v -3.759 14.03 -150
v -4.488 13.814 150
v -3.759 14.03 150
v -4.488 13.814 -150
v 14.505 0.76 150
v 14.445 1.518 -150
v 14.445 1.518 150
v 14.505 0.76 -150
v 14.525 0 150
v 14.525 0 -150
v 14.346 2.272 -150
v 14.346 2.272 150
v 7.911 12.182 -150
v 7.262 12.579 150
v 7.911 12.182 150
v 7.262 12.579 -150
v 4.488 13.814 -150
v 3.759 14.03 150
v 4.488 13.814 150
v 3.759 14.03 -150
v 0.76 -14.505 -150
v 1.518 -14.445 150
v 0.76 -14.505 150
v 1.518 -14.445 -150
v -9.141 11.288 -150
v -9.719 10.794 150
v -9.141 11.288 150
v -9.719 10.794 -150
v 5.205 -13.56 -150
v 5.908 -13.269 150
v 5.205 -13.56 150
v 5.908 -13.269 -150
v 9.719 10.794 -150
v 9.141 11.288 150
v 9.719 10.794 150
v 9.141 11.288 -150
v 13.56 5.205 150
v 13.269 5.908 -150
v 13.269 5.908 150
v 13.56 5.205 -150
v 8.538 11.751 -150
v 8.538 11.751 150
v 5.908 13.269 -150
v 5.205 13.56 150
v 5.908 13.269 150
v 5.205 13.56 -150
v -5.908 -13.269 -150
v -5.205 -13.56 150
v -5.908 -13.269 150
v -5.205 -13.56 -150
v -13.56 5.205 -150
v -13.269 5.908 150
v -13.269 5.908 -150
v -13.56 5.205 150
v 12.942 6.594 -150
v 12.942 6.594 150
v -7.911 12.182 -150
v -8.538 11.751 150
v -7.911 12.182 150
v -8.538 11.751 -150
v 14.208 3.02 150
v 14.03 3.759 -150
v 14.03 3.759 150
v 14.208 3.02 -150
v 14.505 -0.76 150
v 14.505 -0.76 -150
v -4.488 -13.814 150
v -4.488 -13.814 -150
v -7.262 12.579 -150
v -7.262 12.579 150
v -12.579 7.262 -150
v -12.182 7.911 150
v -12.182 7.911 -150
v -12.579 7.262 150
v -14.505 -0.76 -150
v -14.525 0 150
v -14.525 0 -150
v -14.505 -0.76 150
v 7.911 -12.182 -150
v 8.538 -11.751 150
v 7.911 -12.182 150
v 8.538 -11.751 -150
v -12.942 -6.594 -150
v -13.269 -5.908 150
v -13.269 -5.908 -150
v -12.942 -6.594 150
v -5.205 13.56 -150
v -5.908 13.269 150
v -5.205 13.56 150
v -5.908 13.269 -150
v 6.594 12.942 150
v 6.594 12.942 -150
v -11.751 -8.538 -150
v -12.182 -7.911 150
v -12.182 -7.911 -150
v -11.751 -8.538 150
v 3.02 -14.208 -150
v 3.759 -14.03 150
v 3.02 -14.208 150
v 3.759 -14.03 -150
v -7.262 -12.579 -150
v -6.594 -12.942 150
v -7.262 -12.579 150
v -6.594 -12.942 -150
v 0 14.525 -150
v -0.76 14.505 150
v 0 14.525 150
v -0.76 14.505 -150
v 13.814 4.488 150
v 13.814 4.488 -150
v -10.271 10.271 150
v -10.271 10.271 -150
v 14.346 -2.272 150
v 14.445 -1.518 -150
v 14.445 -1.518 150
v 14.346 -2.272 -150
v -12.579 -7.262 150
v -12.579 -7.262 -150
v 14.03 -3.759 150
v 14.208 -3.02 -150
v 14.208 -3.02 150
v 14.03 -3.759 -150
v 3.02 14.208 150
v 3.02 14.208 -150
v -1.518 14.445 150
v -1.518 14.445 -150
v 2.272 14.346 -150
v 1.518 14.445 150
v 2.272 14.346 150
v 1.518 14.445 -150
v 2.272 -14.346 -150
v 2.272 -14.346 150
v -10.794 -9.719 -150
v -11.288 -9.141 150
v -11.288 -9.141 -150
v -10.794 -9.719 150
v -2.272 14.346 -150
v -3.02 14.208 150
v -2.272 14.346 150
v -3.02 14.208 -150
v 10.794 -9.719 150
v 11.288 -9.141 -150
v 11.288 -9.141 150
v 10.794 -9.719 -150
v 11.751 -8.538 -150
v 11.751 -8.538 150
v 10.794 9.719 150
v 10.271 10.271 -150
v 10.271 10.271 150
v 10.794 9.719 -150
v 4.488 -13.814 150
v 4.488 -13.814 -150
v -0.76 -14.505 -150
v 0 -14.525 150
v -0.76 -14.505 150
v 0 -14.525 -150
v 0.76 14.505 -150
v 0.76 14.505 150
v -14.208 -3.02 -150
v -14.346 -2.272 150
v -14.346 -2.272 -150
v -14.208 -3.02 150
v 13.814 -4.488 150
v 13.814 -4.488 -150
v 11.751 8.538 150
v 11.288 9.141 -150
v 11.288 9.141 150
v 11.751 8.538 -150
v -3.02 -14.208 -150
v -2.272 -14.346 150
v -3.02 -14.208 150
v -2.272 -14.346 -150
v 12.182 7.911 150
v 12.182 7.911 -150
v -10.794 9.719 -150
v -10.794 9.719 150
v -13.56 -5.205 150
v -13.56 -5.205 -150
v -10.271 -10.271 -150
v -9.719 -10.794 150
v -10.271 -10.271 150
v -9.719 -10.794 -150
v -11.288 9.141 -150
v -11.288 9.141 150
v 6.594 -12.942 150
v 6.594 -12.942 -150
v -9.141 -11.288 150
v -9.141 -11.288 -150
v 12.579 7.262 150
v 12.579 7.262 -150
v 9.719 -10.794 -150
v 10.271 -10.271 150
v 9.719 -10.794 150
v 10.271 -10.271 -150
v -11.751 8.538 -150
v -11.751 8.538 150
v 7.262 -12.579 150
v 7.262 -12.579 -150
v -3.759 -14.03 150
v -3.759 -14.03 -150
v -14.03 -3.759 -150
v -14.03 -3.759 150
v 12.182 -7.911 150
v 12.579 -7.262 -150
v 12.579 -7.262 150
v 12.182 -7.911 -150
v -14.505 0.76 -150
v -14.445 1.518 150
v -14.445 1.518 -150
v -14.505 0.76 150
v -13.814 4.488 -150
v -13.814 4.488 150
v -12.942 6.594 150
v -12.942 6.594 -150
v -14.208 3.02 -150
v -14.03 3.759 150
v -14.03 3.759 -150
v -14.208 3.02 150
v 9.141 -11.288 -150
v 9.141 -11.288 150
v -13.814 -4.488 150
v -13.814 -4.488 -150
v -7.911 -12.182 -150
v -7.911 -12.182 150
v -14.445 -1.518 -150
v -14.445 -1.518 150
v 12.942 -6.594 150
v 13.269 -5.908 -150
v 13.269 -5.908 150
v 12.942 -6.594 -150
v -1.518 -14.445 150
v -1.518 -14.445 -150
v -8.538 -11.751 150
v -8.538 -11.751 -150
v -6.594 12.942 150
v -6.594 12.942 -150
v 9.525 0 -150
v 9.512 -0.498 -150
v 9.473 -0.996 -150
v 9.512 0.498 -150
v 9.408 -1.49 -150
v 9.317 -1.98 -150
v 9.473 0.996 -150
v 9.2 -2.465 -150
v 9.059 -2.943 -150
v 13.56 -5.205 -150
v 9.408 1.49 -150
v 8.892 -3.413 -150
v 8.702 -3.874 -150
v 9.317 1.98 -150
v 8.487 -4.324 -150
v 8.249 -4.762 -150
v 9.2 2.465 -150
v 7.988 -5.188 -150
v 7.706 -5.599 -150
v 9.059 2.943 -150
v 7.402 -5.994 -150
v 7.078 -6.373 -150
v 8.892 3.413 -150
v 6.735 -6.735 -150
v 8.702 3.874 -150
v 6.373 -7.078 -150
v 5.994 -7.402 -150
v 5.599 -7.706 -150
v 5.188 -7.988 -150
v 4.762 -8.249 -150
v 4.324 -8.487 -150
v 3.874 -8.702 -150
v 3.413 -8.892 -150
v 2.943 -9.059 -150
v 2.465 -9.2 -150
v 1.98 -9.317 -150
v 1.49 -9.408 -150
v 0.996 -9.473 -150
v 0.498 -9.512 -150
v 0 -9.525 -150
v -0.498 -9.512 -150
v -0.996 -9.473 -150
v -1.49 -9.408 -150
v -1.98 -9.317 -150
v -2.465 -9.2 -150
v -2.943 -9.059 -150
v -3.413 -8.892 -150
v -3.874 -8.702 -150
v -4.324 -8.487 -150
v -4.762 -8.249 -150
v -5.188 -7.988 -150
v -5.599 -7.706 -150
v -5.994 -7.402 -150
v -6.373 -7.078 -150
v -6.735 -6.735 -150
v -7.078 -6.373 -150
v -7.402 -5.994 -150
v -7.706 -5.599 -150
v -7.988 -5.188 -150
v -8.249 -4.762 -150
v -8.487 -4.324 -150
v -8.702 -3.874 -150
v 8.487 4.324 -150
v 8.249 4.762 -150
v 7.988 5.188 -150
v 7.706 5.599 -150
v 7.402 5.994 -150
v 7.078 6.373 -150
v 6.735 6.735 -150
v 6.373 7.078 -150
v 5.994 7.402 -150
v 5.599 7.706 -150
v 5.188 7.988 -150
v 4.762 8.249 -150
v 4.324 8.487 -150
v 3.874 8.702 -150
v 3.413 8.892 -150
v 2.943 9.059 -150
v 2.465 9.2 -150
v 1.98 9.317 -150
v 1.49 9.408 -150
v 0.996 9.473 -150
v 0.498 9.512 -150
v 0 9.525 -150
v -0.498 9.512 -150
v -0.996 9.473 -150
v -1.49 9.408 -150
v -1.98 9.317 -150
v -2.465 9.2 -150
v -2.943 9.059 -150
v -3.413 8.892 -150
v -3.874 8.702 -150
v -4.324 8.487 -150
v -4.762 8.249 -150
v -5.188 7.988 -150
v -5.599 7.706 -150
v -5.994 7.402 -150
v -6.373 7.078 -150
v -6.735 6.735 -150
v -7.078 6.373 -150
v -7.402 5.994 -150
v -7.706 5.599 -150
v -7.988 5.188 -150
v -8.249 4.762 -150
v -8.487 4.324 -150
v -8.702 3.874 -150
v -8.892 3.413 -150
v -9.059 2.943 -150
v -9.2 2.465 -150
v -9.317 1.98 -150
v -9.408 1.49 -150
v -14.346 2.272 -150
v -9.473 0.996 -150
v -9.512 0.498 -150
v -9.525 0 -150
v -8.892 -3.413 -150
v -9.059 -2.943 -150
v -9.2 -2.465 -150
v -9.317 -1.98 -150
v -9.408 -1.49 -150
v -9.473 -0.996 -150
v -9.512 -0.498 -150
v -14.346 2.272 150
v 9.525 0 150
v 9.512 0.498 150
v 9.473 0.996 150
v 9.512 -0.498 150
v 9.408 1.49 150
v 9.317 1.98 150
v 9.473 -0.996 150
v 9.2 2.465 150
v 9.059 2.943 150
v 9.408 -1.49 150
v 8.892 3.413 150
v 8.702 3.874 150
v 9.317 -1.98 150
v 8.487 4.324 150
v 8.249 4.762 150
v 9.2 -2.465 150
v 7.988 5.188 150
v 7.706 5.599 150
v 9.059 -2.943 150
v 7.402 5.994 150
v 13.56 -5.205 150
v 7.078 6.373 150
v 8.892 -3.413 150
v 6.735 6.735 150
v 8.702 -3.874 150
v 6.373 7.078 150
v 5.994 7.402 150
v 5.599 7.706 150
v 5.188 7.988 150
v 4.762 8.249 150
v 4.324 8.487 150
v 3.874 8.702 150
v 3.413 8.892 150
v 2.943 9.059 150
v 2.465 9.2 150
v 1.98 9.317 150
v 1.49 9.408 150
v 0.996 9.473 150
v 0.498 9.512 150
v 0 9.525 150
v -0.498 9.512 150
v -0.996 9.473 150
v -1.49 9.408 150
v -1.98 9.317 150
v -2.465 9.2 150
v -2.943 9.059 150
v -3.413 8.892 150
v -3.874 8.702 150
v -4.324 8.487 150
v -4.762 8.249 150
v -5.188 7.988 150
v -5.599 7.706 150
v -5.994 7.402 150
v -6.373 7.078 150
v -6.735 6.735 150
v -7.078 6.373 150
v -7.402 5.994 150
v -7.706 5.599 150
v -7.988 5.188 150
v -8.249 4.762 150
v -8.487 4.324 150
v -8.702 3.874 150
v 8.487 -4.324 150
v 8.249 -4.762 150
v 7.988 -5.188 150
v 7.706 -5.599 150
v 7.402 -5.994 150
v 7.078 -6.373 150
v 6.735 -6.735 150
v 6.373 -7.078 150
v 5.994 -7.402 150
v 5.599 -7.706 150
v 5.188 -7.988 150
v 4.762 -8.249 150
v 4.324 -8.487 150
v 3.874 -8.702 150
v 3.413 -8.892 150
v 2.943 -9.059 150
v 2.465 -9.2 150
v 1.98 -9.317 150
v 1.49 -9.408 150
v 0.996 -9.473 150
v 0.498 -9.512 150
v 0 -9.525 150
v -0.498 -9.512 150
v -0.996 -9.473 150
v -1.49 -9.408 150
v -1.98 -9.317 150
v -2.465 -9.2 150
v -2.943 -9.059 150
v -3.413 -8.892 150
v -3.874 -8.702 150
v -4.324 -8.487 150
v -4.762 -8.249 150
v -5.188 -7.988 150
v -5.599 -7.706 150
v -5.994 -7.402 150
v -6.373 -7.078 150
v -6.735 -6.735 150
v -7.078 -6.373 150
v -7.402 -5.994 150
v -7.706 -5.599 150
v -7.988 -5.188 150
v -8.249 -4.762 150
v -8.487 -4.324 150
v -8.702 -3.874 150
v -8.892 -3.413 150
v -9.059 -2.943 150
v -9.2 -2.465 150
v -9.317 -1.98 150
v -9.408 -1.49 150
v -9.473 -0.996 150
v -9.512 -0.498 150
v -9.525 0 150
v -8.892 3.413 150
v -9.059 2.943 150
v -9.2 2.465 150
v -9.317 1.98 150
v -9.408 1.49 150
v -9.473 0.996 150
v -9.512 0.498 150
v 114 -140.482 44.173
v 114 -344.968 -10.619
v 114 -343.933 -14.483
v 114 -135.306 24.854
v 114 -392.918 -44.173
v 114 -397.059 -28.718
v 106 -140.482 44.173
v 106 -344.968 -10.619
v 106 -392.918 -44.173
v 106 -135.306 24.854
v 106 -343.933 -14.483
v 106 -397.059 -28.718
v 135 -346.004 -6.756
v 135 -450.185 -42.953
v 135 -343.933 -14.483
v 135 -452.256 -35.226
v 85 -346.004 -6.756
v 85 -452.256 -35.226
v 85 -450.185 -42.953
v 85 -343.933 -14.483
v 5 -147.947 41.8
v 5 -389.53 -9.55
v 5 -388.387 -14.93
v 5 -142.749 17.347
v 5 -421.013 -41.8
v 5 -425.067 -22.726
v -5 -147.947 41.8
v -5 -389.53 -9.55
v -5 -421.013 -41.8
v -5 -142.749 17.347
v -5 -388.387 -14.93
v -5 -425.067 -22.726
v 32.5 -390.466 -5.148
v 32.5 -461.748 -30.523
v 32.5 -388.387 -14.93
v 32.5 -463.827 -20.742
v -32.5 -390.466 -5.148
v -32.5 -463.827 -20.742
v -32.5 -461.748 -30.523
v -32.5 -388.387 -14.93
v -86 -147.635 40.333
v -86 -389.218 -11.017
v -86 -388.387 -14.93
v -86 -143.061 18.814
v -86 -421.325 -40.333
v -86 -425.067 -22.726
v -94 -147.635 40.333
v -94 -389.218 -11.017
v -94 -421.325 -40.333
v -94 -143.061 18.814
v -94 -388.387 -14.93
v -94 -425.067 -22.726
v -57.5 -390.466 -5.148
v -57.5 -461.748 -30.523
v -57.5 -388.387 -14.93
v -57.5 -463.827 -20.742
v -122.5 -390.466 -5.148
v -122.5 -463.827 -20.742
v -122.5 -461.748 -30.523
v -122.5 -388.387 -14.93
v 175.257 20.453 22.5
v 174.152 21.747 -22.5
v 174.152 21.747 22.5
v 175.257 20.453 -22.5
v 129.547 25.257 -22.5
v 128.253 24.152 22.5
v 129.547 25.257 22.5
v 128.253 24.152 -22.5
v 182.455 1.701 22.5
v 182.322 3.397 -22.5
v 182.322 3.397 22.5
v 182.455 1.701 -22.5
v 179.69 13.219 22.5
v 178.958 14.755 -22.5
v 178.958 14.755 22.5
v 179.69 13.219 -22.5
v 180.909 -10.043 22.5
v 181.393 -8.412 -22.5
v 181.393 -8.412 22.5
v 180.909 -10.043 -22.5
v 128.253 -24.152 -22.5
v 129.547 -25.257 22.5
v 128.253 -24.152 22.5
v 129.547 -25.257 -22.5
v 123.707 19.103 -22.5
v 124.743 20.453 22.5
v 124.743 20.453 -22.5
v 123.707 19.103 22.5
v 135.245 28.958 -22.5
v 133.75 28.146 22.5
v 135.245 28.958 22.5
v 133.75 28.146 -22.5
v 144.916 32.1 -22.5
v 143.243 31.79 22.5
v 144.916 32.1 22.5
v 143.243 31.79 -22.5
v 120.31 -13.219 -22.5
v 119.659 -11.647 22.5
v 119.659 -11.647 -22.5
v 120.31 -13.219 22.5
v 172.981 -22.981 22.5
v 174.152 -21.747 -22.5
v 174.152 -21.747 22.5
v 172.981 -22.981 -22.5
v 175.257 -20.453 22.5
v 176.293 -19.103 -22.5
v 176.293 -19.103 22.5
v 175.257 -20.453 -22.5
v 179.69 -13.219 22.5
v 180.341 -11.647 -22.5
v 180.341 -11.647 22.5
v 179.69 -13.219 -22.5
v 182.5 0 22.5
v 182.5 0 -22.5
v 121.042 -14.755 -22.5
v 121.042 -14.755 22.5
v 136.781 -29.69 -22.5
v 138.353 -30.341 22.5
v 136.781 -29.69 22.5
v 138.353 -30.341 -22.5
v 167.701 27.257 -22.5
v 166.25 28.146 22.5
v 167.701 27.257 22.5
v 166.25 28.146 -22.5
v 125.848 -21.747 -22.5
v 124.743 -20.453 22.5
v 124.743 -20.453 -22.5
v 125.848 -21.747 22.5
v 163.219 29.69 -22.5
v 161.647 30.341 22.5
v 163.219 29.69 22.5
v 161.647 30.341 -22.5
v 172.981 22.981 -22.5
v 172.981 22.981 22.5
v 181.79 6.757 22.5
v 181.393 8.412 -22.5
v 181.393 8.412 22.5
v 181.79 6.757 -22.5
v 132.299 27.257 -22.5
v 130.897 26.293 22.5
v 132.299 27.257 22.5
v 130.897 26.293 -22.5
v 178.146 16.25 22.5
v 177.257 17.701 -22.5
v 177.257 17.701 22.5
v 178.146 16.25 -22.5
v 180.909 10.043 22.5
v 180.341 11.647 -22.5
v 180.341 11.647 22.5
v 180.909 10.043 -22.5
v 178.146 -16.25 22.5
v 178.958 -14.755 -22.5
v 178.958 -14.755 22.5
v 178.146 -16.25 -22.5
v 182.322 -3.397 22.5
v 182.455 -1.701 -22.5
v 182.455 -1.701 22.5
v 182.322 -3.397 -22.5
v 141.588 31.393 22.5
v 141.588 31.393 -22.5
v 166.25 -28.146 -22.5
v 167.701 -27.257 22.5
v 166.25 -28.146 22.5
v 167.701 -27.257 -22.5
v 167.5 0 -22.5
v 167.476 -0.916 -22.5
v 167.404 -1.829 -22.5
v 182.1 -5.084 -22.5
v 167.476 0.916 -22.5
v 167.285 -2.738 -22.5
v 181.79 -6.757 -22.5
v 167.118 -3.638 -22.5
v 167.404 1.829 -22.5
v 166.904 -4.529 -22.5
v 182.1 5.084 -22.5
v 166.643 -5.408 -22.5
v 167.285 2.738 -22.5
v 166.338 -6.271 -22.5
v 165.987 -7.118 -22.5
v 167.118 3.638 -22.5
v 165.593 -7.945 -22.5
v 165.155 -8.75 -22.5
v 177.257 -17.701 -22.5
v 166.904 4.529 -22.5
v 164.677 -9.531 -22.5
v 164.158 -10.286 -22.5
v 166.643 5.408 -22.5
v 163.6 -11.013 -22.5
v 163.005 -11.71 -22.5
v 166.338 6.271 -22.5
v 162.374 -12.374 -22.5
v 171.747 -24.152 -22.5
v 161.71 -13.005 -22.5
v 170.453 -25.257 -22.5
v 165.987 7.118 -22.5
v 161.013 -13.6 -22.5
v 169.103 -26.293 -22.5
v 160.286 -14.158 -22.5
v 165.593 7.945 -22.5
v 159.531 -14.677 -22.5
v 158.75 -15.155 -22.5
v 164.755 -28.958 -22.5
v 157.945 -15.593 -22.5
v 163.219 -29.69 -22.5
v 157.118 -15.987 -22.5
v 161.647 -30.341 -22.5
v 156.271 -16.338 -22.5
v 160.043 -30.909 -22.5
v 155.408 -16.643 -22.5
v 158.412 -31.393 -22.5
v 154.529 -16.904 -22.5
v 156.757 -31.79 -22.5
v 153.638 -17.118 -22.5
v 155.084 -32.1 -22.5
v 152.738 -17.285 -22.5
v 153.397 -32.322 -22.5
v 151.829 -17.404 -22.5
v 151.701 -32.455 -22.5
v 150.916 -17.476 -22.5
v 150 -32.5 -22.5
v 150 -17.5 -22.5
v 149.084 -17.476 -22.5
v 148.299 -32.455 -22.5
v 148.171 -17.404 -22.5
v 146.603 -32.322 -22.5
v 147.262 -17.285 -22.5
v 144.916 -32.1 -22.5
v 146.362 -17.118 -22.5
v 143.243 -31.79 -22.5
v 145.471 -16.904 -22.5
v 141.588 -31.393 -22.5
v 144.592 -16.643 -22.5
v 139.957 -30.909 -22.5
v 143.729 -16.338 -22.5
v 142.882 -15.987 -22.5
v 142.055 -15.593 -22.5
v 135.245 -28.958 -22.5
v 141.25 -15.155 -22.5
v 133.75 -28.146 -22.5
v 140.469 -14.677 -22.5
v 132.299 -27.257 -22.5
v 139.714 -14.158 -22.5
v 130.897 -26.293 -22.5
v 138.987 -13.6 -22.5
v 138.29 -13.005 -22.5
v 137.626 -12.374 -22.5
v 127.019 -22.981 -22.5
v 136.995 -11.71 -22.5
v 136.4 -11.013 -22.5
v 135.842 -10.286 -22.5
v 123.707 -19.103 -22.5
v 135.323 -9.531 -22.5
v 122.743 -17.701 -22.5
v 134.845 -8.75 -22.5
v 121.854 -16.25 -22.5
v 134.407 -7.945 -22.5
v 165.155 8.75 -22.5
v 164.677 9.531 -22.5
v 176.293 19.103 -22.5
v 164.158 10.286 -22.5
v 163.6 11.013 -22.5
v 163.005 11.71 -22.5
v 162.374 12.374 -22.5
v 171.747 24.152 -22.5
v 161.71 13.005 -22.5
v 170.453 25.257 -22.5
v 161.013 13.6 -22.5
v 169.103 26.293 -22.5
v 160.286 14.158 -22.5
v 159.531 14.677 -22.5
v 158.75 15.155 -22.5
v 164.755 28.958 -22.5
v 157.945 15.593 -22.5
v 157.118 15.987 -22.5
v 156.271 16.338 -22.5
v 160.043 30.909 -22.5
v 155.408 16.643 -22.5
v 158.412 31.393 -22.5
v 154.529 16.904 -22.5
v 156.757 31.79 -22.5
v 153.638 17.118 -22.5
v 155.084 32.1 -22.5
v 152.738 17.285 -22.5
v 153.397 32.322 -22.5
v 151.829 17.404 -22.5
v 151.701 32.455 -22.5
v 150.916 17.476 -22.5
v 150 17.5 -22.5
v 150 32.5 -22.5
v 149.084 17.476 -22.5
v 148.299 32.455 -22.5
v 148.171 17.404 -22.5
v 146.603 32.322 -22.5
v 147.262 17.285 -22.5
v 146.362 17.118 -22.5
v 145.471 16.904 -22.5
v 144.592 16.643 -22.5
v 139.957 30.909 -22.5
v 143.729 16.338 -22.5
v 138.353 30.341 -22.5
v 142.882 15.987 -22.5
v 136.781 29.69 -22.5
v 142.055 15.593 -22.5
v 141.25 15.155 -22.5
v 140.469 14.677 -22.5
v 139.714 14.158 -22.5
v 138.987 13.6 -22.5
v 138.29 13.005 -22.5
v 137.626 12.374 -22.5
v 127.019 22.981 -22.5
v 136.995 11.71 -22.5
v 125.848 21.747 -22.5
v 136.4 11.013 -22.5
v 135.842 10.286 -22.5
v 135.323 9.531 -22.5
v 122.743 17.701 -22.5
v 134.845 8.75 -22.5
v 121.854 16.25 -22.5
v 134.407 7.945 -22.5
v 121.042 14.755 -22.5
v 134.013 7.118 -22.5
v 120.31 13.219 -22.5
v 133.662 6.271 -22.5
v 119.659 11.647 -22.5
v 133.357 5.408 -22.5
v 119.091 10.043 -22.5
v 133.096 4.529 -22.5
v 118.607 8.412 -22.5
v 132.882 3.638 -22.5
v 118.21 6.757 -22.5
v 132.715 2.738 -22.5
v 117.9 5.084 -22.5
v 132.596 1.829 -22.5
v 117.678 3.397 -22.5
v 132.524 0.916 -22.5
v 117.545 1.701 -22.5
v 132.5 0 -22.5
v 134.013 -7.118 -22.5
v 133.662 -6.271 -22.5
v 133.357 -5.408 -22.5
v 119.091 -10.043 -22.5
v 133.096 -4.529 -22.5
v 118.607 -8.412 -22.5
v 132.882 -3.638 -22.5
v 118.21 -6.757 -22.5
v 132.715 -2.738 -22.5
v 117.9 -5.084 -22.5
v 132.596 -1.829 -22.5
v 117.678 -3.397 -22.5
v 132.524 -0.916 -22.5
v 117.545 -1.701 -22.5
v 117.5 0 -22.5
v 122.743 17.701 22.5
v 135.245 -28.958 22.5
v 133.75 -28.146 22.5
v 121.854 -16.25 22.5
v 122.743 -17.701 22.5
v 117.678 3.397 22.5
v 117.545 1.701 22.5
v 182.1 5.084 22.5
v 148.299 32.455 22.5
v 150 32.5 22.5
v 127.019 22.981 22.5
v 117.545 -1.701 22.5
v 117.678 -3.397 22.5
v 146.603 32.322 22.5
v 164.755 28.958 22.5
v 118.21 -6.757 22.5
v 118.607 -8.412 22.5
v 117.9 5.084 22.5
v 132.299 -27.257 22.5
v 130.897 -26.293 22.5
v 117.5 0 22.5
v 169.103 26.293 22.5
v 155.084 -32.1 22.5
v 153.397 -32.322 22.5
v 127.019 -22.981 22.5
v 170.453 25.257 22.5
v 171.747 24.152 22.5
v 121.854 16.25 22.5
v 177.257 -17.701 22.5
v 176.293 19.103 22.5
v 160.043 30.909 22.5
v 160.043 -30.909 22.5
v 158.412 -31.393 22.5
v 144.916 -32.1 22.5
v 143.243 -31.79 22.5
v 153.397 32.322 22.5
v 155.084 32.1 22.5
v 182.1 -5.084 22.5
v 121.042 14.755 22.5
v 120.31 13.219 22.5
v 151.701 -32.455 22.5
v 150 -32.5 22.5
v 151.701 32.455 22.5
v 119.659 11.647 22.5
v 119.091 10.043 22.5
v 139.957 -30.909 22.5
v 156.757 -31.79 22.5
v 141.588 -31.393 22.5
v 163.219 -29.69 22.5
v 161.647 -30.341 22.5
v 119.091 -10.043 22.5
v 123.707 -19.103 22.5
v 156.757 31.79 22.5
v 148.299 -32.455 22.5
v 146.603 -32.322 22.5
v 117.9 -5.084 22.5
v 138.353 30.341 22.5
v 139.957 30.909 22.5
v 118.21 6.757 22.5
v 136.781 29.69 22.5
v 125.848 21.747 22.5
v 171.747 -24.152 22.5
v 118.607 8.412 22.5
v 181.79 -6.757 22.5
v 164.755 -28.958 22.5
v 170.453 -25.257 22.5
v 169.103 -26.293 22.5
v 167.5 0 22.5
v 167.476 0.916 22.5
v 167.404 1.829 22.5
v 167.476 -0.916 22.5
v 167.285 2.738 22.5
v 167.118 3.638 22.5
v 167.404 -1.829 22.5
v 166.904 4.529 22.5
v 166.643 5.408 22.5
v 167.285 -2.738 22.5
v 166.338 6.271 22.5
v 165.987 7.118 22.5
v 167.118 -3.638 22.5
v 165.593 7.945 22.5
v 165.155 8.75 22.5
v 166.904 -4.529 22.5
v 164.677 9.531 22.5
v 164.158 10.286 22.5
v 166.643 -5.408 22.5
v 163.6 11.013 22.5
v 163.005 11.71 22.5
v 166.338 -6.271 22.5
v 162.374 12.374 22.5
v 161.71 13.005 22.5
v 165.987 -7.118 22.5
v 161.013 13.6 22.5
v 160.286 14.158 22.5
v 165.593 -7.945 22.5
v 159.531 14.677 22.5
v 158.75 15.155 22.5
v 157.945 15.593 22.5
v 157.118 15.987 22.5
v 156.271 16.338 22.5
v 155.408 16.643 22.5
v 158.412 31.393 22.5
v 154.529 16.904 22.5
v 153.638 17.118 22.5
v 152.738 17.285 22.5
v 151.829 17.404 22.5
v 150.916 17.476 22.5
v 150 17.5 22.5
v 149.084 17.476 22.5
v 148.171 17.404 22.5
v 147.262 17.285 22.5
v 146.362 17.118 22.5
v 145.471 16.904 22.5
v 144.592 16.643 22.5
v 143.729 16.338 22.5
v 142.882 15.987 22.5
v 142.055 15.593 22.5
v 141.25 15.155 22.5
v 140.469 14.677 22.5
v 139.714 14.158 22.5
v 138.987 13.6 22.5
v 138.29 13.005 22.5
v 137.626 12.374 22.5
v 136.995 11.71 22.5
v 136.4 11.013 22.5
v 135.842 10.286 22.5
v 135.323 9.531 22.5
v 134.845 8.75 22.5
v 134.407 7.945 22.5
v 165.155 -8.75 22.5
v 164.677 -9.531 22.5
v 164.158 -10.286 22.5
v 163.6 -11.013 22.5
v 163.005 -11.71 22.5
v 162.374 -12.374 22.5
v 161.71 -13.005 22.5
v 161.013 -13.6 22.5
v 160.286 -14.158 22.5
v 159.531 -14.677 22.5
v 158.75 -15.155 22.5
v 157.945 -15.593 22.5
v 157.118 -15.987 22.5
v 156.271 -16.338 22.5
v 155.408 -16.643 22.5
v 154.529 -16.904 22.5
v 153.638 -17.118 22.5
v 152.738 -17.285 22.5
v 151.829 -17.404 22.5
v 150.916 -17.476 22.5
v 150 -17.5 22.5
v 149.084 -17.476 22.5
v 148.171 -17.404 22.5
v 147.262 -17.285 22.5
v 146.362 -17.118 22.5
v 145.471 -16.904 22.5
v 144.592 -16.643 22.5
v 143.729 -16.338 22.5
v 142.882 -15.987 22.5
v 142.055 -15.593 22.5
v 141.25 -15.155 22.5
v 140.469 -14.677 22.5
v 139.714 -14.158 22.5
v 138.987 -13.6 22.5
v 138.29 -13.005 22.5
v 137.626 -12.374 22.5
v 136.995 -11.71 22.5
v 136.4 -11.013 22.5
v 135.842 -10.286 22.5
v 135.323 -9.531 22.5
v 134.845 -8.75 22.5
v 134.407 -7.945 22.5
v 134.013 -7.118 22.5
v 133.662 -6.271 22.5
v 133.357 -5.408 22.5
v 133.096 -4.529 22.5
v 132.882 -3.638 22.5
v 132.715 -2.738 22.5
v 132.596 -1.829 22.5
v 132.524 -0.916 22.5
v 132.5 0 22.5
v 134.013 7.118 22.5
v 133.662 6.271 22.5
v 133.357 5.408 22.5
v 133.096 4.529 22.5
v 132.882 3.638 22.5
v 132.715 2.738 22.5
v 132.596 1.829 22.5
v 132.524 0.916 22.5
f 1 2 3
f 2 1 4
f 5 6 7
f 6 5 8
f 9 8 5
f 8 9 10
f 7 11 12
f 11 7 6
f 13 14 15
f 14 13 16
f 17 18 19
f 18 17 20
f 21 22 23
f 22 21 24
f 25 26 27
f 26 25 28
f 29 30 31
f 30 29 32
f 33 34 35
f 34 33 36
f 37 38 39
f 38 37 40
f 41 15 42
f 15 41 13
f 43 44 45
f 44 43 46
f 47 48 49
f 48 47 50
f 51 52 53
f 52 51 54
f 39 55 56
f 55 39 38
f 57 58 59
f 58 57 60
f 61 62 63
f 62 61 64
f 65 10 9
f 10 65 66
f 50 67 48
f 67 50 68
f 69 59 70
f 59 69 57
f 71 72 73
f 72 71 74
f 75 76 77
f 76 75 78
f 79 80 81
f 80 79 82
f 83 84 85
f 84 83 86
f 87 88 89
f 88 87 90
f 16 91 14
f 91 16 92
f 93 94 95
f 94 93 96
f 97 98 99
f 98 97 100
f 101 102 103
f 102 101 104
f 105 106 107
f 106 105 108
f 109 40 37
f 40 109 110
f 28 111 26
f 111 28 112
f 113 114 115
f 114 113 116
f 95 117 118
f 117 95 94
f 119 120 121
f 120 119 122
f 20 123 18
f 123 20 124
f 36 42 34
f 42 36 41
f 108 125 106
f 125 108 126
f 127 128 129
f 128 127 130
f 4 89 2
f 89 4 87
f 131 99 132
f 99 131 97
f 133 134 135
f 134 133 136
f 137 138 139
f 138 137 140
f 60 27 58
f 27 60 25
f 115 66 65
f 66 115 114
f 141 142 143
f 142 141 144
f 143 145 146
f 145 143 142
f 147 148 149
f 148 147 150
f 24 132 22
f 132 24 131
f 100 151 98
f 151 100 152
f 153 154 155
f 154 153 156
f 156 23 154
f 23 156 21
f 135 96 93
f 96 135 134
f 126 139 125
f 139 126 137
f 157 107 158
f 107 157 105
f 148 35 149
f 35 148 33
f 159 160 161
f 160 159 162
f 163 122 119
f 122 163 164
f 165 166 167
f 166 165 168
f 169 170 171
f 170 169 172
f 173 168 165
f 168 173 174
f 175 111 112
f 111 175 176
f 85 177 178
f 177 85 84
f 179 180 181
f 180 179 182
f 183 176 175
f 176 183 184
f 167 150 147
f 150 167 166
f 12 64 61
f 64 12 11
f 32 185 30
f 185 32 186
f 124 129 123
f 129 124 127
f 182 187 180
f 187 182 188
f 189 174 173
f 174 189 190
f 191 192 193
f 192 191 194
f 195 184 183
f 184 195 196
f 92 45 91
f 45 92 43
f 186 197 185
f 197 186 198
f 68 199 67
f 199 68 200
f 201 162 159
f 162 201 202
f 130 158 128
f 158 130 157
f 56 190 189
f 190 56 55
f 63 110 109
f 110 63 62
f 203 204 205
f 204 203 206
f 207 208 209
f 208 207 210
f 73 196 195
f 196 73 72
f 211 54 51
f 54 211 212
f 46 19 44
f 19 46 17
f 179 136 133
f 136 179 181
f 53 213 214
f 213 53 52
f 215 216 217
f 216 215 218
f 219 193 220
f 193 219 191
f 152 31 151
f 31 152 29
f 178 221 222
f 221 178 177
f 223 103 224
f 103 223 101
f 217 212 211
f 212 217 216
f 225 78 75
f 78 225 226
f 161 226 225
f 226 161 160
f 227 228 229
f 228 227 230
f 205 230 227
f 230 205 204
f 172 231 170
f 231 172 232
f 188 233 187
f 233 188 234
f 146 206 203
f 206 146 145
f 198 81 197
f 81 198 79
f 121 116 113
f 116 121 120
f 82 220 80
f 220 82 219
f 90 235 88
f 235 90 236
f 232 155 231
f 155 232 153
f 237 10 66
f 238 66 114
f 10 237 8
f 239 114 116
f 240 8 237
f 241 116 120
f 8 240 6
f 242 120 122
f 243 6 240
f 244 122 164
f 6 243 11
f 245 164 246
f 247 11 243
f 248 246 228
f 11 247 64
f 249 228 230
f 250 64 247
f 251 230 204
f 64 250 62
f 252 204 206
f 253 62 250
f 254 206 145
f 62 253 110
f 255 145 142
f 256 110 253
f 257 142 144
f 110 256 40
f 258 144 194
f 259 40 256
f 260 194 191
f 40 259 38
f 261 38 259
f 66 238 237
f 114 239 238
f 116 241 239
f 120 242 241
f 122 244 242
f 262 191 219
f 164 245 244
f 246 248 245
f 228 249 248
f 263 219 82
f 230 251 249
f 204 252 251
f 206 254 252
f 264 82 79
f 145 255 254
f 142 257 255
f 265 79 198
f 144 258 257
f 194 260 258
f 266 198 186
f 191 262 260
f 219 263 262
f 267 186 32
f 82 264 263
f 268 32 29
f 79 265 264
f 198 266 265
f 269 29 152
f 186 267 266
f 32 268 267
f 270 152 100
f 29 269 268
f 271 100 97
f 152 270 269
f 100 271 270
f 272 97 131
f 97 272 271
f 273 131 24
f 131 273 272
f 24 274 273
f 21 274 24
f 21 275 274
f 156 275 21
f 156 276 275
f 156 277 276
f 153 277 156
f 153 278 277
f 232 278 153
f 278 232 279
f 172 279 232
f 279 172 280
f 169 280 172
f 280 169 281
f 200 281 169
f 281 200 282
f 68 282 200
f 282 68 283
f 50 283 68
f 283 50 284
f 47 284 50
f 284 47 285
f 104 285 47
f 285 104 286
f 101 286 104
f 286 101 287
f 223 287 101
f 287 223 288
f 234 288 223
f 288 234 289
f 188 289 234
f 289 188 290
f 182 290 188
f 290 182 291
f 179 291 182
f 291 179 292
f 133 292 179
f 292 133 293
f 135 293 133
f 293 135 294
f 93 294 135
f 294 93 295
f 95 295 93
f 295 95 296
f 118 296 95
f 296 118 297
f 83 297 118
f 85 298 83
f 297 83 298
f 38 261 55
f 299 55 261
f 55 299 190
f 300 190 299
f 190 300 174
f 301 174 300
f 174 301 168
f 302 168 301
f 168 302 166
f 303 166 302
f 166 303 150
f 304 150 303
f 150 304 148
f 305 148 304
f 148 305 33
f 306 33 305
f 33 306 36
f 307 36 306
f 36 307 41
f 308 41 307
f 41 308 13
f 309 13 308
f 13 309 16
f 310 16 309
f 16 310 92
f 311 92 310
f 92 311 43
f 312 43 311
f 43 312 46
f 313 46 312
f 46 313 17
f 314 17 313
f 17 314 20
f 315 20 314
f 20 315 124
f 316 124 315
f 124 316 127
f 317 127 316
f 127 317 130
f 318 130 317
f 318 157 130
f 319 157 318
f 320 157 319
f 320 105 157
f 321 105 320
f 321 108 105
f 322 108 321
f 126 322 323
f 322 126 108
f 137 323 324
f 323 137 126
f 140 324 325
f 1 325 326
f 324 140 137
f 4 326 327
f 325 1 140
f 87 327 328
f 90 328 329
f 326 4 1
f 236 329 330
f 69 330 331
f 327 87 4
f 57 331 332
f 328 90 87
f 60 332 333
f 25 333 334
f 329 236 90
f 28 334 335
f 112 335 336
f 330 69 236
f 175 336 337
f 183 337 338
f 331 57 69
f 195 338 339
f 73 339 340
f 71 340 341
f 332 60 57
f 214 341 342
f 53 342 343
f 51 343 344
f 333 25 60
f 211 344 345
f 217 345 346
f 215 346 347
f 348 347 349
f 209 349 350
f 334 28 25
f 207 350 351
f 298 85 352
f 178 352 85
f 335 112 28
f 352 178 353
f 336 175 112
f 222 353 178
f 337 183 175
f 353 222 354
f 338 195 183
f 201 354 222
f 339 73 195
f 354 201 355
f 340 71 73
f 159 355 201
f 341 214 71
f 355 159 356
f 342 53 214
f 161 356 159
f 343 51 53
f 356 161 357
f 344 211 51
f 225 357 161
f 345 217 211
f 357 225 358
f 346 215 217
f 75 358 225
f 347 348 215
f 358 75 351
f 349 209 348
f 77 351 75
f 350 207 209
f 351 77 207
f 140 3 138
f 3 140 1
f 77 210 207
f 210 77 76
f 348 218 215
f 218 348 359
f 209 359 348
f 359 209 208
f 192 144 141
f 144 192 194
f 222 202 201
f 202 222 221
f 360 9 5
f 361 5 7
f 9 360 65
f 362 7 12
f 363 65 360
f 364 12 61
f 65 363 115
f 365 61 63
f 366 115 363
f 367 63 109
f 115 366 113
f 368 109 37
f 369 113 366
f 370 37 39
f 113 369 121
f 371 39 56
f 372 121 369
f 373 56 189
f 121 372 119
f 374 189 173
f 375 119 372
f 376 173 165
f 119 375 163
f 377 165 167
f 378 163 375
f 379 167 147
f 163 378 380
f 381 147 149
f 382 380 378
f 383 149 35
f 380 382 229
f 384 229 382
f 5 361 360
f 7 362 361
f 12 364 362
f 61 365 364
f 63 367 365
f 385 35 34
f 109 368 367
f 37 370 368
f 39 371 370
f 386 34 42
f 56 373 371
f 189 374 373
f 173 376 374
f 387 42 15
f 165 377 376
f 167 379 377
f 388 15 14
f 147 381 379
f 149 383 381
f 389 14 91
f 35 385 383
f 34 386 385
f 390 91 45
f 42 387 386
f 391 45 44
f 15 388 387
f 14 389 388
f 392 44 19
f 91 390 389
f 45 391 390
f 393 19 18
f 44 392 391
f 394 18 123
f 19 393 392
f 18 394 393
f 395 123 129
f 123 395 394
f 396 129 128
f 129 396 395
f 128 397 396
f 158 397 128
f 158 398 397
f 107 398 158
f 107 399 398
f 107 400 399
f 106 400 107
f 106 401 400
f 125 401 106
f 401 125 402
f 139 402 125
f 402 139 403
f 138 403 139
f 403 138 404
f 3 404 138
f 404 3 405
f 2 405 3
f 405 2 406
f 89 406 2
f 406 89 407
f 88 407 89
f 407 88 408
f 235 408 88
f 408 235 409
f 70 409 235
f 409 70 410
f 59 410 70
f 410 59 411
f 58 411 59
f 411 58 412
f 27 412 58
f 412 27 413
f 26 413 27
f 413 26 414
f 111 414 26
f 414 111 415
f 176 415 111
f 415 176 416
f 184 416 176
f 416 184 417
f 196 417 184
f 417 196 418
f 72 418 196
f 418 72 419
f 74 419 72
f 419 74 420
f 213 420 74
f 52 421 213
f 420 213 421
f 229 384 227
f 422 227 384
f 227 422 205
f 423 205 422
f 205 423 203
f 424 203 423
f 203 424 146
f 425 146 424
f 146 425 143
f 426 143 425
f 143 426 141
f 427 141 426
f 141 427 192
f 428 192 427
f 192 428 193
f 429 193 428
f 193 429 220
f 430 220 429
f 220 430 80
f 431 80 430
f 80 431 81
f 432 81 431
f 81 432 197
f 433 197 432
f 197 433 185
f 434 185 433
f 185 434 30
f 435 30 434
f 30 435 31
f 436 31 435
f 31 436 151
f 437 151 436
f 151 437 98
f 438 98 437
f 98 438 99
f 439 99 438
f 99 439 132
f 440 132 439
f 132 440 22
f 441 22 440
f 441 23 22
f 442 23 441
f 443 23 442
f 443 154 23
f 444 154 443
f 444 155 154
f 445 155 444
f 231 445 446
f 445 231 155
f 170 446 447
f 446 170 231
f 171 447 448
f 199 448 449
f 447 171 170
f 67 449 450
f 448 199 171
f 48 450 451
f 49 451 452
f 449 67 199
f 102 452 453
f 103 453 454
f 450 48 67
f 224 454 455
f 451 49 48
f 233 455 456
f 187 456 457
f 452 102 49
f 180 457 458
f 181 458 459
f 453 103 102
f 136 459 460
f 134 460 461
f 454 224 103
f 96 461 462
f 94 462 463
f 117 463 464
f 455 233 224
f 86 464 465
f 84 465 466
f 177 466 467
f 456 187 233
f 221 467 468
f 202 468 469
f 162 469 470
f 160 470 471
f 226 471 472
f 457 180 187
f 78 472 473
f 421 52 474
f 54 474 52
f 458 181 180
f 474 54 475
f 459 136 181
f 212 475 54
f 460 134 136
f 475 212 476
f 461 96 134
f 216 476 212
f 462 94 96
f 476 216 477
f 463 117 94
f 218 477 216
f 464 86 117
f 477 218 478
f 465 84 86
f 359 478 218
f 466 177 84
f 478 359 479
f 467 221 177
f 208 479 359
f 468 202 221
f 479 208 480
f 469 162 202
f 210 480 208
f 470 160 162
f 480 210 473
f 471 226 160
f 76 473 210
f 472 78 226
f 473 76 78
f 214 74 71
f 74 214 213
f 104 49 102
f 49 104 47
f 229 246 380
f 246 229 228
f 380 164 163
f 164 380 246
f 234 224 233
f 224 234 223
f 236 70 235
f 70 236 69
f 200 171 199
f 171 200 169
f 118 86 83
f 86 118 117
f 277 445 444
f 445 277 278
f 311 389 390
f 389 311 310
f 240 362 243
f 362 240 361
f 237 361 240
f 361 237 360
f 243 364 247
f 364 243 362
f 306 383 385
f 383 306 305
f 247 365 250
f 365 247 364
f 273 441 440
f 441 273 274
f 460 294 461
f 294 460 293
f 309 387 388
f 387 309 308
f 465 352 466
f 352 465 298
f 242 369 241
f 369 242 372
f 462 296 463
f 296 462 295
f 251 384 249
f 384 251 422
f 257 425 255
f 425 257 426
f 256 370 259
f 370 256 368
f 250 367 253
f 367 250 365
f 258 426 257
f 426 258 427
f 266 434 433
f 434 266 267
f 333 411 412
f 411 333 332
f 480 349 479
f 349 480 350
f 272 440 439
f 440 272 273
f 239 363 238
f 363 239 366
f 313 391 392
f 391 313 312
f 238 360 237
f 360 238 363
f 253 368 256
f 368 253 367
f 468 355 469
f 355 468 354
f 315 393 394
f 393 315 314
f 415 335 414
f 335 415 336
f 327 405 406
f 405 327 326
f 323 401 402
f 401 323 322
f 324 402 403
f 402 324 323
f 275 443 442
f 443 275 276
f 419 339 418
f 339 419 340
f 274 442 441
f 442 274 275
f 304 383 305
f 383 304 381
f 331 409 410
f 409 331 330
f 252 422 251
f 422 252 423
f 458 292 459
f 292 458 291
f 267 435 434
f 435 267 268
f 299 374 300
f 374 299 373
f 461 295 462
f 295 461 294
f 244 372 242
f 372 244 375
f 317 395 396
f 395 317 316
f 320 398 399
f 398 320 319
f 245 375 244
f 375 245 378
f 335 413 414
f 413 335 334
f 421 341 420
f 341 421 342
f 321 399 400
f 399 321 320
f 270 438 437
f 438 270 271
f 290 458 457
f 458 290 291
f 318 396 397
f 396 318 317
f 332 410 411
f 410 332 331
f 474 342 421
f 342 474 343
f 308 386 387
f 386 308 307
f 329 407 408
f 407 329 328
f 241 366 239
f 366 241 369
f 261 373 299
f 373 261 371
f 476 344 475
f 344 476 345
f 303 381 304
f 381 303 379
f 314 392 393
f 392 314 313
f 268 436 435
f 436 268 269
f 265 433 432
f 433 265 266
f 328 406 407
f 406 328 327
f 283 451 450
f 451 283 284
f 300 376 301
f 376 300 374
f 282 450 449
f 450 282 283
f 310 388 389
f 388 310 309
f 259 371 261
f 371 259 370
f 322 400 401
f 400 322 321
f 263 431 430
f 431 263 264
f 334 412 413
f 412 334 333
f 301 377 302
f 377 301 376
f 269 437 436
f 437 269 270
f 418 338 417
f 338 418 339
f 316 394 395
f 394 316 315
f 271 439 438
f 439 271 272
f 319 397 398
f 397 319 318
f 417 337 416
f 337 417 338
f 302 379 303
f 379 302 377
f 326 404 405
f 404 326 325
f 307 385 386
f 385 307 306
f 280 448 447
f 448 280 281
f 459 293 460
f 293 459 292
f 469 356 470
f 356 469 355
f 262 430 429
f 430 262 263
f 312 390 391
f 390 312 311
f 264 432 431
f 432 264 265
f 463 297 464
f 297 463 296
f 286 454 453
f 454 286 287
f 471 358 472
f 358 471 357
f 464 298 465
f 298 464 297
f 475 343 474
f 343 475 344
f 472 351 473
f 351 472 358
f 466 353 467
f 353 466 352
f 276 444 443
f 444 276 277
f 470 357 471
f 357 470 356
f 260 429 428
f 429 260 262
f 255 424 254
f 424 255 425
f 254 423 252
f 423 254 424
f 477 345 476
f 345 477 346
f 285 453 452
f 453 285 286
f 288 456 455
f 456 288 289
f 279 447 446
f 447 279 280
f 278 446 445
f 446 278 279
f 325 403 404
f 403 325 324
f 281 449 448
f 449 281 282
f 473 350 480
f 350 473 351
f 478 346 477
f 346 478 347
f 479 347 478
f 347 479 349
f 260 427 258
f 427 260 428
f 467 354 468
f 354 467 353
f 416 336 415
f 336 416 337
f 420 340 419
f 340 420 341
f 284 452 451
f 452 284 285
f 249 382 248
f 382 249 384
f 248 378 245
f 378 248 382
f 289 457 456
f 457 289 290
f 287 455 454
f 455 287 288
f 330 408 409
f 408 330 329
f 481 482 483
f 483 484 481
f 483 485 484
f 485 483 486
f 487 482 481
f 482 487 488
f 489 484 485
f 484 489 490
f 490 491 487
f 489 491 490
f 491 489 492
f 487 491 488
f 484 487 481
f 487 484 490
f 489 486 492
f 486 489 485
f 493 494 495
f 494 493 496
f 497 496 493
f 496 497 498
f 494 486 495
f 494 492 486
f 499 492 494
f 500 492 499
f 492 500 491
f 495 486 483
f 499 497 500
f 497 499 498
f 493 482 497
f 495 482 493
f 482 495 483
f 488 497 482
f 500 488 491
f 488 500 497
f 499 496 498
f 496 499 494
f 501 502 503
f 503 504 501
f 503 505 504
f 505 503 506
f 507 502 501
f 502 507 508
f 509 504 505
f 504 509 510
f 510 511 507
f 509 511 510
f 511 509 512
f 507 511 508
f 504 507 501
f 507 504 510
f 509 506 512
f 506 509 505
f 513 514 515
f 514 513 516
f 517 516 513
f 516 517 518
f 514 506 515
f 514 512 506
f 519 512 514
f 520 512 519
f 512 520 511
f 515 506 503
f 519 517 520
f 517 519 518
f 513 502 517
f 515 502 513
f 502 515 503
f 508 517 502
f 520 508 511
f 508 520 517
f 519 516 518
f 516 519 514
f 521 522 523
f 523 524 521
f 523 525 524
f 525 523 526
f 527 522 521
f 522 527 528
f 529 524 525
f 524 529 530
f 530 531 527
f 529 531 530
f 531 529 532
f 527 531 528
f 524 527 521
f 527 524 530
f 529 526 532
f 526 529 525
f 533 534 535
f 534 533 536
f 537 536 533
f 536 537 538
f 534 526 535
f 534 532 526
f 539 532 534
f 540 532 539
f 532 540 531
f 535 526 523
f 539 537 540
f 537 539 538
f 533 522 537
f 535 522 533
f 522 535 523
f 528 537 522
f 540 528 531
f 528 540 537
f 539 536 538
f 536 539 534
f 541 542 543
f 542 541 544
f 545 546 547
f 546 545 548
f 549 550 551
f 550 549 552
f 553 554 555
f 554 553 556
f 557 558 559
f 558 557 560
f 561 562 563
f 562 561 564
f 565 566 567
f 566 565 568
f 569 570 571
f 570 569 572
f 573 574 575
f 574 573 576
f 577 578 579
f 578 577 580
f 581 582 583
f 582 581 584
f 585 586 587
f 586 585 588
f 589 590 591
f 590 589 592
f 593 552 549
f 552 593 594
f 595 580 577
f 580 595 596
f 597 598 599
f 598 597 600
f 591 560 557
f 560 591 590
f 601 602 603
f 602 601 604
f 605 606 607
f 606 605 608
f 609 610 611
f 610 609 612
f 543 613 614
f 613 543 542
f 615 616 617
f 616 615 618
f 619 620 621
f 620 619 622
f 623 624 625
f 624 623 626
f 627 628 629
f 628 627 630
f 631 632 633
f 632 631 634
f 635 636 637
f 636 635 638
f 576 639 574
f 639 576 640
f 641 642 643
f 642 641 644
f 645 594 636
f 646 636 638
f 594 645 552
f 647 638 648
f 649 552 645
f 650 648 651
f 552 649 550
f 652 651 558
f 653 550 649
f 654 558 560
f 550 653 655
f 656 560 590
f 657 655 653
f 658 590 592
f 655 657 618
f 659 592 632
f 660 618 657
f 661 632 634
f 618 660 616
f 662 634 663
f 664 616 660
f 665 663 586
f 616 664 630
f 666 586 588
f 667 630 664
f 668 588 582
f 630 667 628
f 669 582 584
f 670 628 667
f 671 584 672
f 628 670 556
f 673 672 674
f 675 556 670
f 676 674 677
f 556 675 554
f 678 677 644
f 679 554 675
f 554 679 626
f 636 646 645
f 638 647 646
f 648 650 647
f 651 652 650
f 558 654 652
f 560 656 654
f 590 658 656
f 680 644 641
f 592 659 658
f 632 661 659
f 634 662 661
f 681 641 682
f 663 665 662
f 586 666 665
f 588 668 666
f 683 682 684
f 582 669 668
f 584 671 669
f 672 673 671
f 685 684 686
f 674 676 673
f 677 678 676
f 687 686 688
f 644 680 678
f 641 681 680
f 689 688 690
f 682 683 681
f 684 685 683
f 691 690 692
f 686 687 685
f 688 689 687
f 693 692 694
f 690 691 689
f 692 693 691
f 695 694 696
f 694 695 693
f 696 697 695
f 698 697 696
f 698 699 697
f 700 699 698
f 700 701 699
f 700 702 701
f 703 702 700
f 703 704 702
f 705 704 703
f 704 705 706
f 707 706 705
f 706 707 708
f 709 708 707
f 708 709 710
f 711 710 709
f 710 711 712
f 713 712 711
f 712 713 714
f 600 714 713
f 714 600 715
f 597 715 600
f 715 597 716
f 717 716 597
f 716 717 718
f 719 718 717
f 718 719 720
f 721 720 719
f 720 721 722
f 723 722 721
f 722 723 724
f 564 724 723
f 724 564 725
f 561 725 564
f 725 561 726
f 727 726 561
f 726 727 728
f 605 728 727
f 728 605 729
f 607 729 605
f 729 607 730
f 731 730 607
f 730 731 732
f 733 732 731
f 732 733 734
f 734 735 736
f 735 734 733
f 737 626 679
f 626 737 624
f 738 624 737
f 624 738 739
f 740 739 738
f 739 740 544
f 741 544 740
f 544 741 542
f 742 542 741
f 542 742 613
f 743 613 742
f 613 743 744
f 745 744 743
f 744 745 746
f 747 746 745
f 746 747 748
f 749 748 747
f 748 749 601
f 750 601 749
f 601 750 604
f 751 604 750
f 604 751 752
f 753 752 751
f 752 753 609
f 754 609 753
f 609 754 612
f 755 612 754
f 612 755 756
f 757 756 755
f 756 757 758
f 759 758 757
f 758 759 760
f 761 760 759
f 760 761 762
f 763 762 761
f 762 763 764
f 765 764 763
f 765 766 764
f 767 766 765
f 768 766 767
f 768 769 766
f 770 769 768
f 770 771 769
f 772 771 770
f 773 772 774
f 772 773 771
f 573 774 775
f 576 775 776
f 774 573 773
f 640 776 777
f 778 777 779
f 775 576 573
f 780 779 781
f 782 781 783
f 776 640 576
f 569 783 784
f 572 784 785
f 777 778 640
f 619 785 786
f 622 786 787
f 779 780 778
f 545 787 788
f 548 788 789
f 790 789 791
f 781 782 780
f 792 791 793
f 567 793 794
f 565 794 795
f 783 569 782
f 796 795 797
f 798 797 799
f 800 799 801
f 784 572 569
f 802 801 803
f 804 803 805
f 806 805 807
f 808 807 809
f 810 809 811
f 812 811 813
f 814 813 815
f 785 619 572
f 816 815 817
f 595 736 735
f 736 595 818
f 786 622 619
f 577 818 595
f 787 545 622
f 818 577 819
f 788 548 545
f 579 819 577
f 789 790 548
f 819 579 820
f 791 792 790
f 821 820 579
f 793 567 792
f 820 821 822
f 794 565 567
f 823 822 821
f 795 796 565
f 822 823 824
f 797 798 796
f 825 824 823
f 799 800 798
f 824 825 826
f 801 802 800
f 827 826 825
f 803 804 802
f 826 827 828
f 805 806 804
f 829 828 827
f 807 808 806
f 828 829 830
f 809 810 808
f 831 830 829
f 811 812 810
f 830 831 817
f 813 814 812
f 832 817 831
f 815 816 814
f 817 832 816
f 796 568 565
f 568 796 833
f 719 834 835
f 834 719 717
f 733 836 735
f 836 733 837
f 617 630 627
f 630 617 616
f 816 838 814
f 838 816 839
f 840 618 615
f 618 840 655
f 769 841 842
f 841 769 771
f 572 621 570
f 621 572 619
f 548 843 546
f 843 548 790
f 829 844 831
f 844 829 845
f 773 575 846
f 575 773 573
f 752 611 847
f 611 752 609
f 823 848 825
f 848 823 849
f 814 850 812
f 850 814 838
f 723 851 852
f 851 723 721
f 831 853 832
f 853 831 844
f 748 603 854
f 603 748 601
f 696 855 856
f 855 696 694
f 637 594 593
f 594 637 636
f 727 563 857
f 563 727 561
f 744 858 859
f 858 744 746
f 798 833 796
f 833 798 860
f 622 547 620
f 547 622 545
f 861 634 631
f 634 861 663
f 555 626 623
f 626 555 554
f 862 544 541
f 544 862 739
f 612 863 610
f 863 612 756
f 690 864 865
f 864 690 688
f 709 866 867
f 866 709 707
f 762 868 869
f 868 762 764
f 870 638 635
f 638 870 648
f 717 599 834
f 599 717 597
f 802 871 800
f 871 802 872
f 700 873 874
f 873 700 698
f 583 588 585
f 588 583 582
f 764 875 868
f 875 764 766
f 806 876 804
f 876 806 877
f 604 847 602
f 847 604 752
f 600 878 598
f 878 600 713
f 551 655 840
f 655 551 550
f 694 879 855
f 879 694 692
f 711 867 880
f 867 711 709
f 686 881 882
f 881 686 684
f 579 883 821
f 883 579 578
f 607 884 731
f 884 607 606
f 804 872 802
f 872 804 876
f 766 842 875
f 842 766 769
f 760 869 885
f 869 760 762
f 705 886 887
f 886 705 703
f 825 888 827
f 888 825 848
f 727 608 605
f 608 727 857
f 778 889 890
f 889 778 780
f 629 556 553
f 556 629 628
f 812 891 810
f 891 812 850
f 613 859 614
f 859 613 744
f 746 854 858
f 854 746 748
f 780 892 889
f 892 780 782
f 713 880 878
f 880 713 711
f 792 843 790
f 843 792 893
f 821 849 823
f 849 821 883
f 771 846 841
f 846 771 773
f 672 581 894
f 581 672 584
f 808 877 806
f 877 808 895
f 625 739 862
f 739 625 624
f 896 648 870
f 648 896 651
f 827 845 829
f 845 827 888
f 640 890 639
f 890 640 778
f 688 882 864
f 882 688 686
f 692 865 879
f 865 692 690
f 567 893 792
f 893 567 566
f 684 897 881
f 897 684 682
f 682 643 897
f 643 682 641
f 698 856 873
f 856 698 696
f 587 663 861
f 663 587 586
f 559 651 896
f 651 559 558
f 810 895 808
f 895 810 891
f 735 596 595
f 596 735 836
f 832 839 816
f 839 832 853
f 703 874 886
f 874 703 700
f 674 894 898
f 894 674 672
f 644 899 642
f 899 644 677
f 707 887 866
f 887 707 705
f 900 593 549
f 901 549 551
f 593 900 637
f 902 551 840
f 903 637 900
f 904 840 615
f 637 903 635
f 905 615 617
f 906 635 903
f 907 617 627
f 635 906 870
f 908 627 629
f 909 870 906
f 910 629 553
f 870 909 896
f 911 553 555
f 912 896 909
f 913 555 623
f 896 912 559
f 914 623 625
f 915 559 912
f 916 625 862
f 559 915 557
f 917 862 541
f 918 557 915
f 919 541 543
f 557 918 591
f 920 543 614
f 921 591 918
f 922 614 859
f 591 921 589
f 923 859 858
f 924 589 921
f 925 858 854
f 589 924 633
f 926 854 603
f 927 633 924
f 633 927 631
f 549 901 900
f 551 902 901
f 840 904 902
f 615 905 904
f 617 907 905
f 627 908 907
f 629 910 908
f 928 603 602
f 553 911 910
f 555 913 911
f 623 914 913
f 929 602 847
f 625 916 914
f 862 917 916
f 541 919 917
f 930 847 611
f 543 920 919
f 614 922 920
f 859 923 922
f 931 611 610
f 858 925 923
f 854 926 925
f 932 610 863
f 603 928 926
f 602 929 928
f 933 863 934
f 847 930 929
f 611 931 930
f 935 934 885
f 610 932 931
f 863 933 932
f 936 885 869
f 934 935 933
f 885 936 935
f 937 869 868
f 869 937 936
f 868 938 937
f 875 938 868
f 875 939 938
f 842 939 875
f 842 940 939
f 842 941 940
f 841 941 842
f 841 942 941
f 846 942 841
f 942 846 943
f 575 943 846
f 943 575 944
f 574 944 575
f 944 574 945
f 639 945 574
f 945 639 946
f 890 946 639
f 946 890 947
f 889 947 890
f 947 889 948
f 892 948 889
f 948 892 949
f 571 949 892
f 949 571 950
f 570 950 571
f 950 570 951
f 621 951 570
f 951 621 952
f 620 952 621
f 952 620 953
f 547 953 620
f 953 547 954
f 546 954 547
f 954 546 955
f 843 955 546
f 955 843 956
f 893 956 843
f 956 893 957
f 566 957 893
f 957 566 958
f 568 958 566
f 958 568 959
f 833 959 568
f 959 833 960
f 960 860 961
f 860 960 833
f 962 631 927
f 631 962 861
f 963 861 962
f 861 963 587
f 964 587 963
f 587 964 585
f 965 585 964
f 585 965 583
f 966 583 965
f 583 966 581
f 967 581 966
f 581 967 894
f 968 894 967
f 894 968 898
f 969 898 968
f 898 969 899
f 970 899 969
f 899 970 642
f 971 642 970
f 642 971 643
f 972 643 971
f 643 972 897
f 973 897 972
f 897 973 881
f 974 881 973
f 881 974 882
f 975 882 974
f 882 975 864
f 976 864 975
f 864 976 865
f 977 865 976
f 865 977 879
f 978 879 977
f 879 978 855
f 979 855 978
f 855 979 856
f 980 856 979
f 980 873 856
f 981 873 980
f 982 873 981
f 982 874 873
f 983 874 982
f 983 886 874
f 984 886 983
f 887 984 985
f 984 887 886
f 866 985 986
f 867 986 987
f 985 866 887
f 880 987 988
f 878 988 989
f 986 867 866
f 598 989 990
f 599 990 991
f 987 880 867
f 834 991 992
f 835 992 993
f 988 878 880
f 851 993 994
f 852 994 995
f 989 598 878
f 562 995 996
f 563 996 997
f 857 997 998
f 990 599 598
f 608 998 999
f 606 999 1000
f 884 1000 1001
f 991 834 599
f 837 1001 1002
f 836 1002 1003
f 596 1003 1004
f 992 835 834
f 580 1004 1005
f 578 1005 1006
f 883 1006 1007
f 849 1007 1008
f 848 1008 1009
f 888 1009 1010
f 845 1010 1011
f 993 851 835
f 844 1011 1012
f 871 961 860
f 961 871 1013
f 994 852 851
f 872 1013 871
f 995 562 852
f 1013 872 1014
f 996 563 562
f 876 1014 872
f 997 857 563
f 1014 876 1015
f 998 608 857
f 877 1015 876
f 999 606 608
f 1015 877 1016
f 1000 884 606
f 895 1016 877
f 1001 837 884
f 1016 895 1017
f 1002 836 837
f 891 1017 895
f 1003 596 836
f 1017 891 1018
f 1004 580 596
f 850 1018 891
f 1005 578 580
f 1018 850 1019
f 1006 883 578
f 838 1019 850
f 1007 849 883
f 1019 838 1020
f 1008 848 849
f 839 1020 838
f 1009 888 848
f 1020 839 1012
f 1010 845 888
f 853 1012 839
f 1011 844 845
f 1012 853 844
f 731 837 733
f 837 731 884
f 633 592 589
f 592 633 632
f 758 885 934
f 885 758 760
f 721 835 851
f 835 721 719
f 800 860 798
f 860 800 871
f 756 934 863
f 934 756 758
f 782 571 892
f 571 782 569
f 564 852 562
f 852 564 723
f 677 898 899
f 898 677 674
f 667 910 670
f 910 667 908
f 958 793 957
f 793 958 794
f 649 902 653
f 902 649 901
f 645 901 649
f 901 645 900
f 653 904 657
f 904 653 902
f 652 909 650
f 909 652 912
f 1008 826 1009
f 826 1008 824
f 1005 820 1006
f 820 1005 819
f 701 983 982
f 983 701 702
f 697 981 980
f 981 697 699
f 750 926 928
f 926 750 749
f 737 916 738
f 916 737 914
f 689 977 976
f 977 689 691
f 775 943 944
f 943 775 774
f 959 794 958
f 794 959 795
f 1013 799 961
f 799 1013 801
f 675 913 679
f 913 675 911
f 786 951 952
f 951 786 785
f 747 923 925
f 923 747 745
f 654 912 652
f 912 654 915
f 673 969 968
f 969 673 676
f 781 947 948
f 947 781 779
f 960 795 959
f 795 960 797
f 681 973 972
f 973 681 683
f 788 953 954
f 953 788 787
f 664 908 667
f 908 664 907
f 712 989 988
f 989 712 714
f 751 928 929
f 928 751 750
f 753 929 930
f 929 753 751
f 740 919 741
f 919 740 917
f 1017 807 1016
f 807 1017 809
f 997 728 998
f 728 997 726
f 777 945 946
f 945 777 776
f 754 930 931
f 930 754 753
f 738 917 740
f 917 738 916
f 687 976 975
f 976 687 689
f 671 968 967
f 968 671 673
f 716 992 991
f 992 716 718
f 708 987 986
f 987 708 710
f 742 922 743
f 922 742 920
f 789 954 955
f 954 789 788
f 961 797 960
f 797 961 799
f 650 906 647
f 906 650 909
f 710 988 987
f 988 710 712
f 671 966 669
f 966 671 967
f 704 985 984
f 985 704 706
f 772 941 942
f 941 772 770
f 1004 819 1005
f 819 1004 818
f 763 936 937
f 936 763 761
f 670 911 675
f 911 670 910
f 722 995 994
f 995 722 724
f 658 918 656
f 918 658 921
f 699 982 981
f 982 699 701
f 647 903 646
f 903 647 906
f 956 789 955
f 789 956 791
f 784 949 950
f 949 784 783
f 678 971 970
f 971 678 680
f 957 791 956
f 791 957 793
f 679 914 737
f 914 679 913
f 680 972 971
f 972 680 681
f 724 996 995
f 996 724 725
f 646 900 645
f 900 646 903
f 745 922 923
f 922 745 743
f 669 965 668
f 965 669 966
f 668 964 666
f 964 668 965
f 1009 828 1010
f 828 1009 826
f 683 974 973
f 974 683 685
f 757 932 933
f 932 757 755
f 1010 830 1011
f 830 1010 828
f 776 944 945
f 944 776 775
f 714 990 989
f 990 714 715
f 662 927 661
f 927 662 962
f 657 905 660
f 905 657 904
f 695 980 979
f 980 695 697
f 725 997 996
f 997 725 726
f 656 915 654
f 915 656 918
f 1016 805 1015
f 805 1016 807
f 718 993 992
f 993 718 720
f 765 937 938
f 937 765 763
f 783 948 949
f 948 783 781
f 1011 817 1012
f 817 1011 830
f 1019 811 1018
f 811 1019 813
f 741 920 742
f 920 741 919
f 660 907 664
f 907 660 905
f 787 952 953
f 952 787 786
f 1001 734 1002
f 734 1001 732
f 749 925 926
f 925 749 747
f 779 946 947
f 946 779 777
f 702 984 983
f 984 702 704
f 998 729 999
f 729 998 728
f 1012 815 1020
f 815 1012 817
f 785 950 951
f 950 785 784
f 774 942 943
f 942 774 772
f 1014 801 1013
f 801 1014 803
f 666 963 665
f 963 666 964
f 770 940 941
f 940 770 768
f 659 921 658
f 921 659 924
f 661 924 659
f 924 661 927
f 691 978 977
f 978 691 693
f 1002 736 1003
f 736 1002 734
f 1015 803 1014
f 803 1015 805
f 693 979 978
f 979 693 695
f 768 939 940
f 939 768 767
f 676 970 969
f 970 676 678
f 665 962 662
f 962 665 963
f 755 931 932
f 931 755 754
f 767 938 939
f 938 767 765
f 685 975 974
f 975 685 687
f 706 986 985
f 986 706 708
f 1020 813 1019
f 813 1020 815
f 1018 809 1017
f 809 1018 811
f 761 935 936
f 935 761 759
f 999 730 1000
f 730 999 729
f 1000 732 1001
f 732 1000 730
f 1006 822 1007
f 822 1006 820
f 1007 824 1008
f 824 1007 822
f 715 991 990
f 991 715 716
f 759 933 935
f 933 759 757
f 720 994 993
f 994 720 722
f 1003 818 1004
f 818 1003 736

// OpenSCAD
// ====================================================================================
// REVOLUTIONARY TECHNOLOGY COMPANY & UNIVERSITY OF WASHINGTON DEPARTMENT OF PHYSICS
// Subsystem: copo_pedal_box.scad (Parametric 1969 Authentic Pedal Assembly)
// Core Principle: Replicates 1969 mechanical arc sweeps while integrating high-accuracy hall arrays
// Center Origin (0,0,0) = Centerpoint of the Master Splined Pivot Shaft Axis
// ====================================================================================

$fn = 120; // High-precision CNC laser-cutting profile resolution

// --- Master Variant Configuration Selector ---
// 1 = 6-Speed Manual Configuration, 2 = High-Performance Automatic Configuration
PEDAL_VARIANT_SELECT = 1; 

// --- 1969 Historical Geometric Constants (mm) ---
inch_to_mm         = 25.4;
pivot_shaft_dia    = 0.75 * inch_to_mm; // 19.05 mm solid splined steel axis shaft
pedal_arm_thickness= 8.00;              // Authentic thick-stamped carbon steel plate
throttle_drop_len  = 10.5 * inch_to_mm; // 266.7 mm authentic arm lever length
brake_drop_len     = 11.2 * inch_to_mm; // 284.48 mm authentic heavy-ratio pedal stroke

// --- Variant Pad Profiles ---
brake_pad_width = (PEDAL_VARIANT_SELECT == 2) ? 130.0 : 65.0; // Automatic gets the wide brake pad style
variant_tag     = (PEDAL_VARIANT_SELECT == 2) ? "1969_COPO_AUTOMATIC_PADS" : "1969_SS_6_SPEED_MANUAL_PADS";

module main_splined_pivot_bar() {
    echo(str("ASSEMBLING FACTORY PEDAL BAY RUNNERS: ", variant_tag));
    // Hardened master steel shaft where all pedal levers pivot
    color("DimGrey") {
        difference() {
            cylinder(d=pivot_shaft_dia + 10, h=300, center=true);
            cylinder(d=pivot_shaft_dia, h=302, center=true); // Internal clearance spline path
        }
    }
}

module authentic_pedal_levers() {
    // 1. THROTTLE PEDAL ASSEMBLY (Maintains authentic 1969 lean angle and pad sweep)
    color("Black") {
        translate([110, -throttle_drop_len, 0])
            rotate([15, 0, 0]) {
                // Stamped lever bar
                cube([pedal_arm_thickness, throttle_drop_len, 20], center=true);
                // Authentic thin rectangular throttle foot-pad faceplate
                translate([0, -throttle_drop_len/2, 10])
                    cube([50, 110, 8], center=true);
            }
    }
    
    // 2. MAIN BRAKE LEVER ASSEMBLY 
    color("SteelBlue") {
        translate([0, -brake_drop_len, 0])
            rotate([12, 0, 0]) {
                cube([pedal_arm_thickness + 2, brake_drop_len, 25], center=true);
                // Adapts automatically between narrow manual pad or wide automatic pad
                translate([0, -brake_drop_len/2, 12])
                    cube([brake_pad_width, 75, 10], center=true);
            }
    }

    // 3. CLUTCH LEVER MODULE (Rendered only if the 6-Speed Manual profile is chosen)
    if (PEDAL_VARIANT_SELECT == 1) {
        color("SlateGrey") {
            translate([-90, -brake_drop_len, 0])
                rotate([12, 0, 0]) {
                    cube([pedal_arm_thickness, brake_drop_len, 22], center=true);
                    // Narrow matching clutch face pad profile
                    translate([0, -brake_drop_len/2, 12])
                        cube([65, 75, 10], center=true);
                }
        }
    }
}

module sealed_sensor_housing() {
    // Mounted at the outer edge of the pivot bar to protect high-accuracy tracking arrays
    translate([150, 0, 0]) {
        color("DarkSlateGrey") {
            difference() {
                cylinder(d=65, h=45, center=true); // Weatherproof billet guard box
                cylinder(d=35, h=47, center=true); // Internal cavity for dual-channel hall chips
            }
        }
    }
}

// --- Compile System Framework Matrix ---
union() {
    main_splined_pivot_bar();
    authentic_pedal_levers();
    sealed_sensor_housing();
}
